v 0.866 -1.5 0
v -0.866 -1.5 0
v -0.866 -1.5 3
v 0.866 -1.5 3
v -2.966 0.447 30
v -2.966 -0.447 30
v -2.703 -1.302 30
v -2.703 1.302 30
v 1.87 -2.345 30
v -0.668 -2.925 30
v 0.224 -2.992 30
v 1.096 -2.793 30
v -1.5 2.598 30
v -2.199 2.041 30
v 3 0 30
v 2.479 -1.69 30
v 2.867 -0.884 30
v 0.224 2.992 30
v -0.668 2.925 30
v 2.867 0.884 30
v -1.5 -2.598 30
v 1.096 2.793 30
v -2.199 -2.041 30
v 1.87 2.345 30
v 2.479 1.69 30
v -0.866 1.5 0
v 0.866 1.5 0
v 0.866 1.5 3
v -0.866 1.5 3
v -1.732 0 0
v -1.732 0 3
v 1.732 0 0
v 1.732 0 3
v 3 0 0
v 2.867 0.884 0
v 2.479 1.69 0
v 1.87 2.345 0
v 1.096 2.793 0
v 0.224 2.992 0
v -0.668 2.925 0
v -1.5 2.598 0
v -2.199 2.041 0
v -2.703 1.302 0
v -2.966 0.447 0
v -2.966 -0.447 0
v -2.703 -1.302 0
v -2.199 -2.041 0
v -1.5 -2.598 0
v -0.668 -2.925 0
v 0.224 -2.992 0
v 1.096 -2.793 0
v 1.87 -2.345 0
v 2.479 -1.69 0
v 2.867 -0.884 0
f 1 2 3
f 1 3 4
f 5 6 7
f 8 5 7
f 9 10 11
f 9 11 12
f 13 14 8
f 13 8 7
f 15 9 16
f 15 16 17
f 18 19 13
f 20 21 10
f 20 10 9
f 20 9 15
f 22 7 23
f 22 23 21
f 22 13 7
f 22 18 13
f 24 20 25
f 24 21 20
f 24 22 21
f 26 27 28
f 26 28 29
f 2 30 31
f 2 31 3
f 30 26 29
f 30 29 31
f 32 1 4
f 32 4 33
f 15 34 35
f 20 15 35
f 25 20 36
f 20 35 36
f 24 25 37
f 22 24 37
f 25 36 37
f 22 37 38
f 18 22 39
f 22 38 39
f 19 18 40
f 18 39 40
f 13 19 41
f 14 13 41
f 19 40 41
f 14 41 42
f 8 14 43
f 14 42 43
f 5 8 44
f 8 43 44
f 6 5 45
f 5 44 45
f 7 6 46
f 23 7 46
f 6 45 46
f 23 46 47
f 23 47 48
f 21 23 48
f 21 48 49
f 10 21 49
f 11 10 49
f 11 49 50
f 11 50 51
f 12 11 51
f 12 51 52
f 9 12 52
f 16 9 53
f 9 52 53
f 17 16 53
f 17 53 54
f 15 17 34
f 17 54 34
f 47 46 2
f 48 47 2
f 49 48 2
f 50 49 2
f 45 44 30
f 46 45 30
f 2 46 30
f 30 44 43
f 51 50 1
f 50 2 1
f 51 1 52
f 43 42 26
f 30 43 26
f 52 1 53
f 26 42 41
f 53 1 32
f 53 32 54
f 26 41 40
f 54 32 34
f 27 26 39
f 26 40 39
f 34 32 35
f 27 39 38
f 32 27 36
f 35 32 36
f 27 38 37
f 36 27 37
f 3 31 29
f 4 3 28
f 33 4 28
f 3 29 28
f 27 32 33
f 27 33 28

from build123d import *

# Parameters (mm, degrees)
S01_M6_CONNECTING_STUD_R      = 3
F_01_M6_CONNECTING_STUD_DEPTH = 30
F_02_START                    = -0.1
F_02_HEX_KEY_SOCKET_DEPTH     = 3.1


with BuildPart() as part:
    # S01 - M6 connecting stud → 01 - M6 connecting stud (new body)
    with BuildSketch(Plane.XY):
        Circle(S01_M6_CONNECTING_STUD_R)
    extrude(amount=F_01_M6_CONNECTING_STUD_DEPTH)

    # S02 - Hex key socket → 02 - Hex key socket (cut)
    with BuildSketch(Plane.XY.offset(F_02_START)):
        Polygon((1.732050808, 0), (0.866025404, 1.5), (-0.866025404, 1.5), (-1.732050808, 0), (-0.866025404, -1.5), (0.866025404, -1.5), align=None)
    extrude(amount=F_02_HEX_KEY_SOCKET_DEPTH, mode=Mode.SUBTRACT)


solid = part.part
